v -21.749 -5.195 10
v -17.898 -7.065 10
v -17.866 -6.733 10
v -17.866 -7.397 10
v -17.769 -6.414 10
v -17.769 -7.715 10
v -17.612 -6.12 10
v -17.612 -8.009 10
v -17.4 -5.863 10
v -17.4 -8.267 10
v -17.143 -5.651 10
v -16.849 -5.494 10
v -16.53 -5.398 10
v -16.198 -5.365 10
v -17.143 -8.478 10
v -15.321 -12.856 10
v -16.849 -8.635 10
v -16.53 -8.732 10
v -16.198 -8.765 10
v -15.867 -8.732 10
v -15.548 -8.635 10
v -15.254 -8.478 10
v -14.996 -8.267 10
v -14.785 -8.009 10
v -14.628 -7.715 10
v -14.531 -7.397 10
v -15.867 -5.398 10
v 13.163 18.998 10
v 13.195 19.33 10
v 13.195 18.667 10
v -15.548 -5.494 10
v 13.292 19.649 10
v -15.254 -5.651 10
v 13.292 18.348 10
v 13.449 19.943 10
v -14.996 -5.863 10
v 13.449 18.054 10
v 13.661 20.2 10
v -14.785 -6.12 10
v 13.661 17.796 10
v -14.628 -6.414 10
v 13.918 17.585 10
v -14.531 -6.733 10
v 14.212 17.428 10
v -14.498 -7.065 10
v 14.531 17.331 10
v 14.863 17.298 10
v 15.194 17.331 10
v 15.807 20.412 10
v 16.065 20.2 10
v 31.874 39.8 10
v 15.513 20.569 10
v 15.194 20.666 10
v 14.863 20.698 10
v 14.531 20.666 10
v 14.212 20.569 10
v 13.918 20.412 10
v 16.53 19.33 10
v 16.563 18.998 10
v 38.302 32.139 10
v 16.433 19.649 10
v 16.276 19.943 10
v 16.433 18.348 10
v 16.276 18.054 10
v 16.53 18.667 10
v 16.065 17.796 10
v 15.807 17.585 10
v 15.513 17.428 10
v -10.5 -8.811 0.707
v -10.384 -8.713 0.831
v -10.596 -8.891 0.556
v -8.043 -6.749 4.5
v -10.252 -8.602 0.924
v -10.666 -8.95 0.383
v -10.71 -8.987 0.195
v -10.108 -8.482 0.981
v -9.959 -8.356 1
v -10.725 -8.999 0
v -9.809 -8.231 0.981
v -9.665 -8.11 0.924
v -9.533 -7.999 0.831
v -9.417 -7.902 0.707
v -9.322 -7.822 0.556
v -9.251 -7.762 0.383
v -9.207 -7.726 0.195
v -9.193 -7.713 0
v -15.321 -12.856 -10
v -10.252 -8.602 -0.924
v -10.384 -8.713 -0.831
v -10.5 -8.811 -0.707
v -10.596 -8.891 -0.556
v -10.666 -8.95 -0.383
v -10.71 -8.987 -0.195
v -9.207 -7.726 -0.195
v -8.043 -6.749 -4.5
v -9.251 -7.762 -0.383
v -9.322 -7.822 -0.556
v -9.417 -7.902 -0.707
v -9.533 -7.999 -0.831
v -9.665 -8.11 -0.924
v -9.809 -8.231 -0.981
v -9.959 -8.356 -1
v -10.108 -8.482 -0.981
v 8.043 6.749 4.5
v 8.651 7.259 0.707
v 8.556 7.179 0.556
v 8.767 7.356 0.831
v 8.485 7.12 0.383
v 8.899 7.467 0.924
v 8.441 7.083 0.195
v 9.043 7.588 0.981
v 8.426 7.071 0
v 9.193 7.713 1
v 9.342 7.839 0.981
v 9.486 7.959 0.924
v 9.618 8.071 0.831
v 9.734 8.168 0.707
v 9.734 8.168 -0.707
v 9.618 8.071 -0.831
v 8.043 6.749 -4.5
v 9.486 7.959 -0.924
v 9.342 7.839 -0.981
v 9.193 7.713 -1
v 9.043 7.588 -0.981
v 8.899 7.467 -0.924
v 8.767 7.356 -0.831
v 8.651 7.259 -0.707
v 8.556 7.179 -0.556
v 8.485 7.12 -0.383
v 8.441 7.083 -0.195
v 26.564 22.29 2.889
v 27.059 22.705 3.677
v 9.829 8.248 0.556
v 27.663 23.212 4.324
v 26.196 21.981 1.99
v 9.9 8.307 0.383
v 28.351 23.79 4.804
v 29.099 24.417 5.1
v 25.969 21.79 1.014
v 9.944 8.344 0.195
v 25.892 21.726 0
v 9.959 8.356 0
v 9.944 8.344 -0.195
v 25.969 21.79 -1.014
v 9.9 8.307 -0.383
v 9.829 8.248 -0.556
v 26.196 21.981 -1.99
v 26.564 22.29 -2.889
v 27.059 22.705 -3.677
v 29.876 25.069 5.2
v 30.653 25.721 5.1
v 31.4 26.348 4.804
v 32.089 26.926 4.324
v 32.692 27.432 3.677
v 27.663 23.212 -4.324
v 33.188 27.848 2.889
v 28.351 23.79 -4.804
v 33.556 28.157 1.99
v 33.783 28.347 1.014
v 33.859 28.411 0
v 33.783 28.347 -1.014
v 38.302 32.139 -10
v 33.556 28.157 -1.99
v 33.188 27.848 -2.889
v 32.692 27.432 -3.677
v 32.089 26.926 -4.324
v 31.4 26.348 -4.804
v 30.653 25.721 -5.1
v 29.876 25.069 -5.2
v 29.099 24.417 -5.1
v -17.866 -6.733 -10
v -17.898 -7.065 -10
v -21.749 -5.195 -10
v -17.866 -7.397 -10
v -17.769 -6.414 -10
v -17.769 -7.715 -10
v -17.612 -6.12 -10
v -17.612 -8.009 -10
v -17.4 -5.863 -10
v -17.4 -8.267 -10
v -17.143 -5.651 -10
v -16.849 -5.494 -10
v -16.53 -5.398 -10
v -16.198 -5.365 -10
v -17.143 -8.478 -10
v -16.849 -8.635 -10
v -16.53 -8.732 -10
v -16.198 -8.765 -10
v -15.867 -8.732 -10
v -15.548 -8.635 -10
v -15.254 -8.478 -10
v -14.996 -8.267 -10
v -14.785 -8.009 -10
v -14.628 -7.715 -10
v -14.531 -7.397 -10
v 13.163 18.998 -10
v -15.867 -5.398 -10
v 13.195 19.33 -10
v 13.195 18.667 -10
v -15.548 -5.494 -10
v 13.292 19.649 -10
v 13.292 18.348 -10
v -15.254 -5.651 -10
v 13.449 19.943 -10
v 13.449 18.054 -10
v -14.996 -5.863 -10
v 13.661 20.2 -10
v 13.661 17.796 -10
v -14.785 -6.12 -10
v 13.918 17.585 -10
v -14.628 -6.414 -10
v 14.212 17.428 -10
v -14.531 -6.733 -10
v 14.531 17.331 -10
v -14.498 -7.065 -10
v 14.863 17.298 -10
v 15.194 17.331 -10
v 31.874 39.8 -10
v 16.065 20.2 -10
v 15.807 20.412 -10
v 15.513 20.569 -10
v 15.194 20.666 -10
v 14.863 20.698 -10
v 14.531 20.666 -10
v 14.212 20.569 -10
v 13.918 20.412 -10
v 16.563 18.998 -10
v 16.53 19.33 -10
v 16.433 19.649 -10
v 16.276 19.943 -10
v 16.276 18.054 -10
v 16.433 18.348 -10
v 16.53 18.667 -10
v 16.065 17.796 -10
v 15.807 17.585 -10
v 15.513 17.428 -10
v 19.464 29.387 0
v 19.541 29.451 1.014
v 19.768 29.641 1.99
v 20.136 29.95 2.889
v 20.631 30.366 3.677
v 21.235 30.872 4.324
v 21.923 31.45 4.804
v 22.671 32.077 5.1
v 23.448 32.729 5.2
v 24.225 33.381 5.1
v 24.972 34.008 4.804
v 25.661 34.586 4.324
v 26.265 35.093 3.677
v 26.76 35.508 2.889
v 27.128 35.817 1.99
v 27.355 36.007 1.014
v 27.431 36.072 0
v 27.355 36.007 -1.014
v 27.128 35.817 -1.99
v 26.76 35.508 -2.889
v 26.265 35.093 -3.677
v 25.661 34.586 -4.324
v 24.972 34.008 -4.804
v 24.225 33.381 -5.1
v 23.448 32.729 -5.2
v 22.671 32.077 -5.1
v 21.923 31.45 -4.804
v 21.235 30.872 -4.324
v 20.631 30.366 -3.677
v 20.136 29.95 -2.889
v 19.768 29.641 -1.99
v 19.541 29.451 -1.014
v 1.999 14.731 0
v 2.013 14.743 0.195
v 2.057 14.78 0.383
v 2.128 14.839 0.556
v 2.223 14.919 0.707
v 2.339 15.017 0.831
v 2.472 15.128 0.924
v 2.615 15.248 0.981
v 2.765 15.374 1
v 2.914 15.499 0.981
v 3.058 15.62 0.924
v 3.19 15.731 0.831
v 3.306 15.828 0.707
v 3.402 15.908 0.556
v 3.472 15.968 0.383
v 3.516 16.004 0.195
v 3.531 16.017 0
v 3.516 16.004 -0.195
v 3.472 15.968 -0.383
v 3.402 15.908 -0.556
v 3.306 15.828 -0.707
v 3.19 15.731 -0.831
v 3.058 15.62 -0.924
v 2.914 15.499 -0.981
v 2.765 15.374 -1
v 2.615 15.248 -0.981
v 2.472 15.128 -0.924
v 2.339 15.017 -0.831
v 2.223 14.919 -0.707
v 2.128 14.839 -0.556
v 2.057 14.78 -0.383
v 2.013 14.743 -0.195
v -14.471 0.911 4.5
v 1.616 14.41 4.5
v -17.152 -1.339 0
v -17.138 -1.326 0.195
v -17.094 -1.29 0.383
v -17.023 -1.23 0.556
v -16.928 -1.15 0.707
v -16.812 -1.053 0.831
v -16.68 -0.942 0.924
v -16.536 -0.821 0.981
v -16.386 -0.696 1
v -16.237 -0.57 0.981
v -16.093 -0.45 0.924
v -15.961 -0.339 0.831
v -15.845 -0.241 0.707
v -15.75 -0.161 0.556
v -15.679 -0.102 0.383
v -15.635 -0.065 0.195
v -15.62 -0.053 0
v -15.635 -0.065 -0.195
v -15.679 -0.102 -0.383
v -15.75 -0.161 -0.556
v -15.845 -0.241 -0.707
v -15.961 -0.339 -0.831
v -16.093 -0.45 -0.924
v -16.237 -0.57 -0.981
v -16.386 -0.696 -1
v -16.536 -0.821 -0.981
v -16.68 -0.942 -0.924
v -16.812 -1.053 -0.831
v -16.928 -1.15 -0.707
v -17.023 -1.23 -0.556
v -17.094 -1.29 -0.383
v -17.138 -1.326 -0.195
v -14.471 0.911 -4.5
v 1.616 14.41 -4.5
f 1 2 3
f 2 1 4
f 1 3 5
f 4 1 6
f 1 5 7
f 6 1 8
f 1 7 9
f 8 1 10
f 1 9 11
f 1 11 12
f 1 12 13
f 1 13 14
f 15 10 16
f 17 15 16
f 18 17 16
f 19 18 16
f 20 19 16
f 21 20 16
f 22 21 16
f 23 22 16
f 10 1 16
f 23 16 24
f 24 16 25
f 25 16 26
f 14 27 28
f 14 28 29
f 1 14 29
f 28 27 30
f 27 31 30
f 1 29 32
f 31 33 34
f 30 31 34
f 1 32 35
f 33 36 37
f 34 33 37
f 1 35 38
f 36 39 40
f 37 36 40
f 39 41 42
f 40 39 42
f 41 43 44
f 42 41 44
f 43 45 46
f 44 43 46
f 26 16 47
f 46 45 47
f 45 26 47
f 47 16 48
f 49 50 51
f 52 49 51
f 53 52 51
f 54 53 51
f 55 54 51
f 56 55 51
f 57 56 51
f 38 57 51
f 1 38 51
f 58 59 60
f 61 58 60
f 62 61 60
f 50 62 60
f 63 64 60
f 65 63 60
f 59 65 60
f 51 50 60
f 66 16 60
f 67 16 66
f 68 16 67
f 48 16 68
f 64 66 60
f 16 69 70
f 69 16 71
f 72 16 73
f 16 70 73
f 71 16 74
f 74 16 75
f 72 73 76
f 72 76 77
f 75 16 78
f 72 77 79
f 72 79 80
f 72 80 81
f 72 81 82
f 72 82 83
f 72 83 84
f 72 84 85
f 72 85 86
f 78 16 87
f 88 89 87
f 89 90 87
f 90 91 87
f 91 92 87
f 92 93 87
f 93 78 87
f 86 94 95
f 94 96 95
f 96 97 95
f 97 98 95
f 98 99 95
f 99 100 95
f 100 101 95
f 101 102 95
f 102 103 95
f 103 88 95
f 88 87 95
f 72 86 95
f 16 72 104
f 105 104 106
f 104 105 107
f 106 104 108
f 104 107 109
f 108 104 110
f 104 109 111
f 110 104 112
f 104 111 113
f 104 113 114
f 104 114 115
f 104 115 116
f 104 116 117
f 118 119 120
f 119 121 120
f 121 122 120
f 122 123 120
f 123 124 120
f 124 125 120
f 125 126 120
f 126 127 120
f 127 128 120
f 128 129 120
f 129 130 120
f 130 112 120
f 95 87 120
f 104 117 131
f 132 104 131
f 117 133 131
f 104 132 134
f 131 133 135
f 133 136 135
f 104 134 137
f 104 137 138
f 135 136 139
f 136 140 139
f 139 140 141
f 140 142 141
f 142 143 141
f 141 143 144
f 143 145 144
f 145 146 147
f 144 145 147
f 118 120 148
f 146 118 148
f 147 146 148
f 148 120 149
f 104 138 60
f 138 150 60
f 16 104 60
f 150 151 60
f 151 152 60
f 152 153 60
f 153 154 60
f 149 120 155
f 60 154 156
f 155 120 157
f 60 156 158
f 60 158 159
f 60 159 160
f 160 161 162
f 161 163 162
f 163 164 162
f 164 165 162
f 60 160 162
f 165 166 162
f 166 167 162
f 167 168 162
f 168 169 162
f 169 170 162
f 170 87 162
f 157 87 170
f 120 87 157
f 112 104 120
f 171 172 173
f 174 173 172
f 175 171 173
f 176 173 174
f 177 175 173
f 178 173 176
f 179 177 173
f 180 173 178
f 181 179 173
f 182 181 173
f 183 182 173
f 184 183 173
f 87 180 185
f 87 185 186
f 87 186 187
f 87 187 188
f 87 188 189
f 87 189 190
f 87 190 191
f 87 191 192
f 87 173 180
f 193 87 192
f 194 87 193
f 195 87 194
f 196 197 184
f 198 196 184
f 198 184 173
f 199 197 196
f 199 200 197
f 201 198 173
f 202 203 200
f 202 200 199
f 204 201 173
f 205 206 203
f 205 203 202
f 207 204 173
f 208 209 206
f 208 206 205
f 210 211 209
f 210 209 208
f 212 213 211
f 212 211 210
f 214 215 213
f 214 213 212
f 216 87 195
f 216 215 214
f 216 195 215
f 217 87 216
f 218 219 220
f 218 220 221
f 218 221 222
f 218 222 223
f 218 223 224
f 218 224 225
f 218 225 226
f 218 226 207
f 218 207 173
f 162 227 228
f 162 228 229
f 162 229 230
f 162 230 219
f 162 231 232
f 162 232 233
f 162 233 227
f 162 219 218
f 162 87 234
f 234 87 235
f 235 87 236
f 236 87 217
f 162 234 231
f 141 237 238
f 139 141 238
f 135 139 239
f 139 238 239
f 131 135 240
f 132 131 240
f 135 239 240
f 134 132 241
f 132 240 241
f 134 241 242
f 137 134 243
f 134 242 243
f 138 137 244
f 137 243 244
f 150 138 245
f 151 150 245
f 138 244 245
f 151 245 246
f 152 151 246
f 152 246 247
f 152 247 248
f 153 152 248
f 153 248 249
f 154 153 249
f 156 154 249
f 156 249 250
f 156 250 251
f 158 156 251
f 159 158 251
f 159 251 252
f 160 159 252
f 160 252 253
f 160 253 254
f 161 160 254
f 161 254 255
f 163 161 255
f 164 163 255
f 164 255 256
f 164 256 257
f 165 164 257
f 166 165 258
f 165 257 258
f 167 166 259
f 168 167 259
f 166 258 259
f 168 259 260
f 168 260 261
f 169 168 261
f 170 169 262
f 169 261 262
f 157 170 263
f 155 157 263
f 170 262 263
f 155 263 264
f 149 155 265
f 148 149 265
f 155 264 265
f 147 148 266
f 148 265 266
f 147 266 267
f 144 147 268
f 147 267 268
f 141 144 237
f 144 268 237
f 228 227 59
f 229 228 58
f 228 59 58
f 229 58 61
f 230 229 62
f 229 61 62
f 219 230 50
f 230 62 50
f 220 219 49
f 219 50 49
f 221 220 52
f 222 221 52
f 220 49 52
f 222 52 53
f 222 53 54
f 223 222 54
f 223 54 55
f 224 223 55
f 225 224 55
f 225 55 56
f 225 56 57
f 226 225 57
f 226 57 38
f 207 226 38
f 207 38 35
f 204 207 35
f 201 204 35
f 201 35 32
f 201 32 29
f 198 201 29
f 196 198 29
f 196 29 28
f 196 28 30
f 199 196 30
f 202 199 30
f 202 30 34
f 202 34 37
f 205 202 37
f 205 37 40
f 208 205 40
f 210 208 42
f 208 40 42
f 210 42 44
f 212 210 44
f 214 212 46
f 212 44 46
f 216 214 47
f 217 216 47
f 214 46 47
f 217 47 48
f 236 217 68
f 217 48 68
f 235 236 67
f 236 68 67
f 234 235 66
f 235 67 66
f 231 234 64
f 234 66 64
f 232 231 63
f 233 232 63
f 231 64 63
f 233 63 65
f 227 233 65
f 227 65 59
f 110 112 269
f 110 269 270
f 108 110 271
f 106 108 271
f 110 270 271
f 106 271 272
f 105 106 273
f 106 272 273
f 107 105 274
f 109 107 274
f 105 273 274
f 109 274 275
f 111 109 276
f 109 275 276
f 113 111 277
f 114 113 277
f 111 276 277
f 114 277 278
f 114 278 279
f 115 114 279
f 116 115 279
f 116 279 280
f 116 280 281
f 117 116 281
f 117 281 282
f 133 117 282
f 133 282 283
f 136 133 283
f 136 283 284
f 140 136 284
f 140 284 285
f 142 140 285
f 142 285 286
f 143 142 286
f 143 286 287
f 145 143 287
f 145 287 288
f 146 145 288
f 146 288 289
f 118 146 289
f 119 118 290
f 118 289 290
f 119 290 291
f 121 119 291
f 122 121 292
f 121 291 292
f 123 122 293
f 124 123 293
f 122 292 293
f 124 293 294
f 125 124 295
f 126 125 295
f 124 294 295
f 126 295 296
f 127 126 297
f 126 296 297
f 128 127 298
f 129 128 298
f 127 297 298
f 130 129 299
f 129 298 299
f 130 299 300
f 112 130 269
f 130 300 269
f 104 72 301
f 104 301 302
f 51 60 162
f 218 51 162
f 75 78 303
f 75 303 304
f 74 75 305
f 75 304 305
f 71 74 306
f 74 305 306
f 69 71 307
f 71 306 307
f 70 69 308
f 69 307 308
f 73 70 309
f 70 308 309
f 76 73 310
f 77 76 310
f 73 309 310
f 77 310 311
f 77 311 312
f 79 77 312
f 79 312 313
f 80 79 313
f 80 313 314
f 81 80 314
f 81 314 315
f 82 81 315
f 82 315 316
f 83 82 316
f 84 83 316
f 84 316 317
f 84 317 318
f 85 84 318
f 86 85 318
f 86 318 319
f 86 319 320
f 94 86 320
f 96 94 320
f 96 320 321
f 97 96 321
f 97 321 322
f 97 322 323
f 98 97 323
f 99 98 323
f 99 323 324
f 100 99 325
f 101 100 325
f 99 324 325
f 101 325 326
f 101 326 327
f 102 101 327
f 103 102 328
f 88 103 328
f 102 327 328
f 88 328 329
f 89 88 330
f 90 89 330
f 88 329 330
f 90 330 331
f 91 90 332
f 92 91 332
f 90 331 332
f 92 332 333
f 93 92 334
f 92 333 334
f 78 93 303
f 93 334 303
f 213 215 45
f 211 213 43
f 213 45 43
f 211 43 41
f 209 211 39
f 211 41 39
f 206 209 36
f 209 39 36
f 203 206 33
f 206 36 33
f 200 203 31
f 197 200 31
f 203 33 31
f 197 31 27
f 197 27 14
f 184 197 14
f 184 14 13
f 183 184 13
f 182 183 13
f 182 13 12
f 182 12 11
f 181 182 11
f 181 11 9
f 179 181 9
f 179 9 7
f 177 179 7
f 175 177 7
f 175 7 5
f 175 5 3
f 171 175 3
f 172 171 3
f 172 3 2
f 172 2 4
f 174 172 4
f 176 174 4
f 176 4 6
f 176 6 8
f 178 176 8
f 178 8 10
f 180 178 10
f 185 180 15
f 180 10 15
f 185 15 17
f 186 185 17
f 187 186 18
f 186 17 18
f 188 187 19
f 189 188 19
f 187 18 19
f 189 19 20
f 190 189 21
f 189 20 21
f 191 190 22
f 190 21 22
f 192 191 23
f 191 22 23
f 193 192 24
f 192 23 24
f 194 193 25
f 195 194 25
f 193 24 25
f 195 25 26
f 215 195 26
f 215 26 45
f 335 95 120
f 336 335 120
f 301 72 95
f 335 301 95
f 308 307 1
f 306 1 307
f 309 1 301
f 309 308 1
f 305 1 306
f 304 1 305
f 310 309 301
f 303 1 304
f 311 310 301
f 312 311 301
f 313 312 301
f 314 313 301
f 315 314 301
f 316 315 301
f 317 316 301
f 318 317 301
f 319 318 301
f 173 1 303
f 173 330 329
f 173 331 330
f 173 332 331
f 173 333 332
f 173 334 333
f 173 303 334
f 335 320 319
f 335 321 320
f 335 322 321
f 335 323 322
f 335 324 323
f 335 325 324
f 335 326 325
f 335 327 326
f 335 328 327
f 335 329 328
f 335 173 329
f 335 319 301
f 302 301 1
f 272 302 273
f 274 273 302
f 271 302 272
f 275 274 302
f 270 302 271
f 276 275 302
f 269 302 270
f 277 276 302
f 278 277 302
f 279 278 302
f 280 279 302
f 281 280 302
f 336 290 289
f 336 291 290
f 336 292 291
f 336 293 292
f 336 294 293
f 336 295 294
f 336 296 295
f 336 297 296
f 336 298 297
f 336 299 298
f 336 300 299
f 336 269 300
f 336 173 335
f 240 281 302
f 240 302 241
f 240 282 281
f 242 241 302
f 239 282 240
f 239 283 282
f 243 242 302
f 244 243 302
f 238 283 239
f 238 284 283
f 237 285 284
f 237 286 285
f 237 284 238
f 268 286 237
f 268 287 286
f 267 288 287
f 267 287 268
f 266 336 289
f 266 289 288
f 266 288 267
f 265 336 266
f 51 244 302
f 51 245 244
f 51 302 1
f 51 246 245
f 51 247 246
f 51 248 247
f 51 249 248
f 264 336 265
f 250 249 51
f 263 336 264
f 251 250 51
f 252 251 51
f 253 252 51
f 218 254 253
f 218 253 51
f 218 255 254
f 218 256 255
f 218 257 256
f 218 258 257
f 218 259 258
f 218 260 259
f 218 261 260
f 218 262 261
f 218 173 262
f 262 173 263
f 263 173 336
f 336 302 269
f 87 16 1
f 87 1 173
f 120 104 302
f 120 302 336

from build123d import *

# Parameters (mm, degrees)
SKETCH_1_W          = 70
SKETCH_1_H          = 20
SKETCH_1_W_2        = 21
SKETCH_1_H_2        = 9
EXTRUDE_1_DEPTH     = 10
CUT_EXTRUDE_1_REACH = 57.98
SKETCH_3_R          = 5.2
SKETCH_3_R_2        = 1
CUT_EXTRUDE_2_REACH = 60.746
SKETCH_4_R          = 1.7


with BuildPart() as part:
    # 草图1 → 凸台-拉伸1 (new body)
    with BuildSketch(Plane(origin=(0, 0, 0), x_dir=(0.7660444431189771, 0.6427876096865406, 0), z_dir=(-0.6427876096865406, 0.7660444431189771, 0))):
        with Locations((15, 0)):
            Rectangle(SKETCH_1_W, SKETCH_1_H)
        Rectangle(SKETCH_1_W_2, SKETCH_1_H_2, mode=Mode.SUBTRACT)
    extrude(amount=EXTRUDE_1_DEPTH)

    # 草图3 → 切除-拉伸1 (cut, up to next)
    with BuildSketch(Plane(origin=(-6.427876097, 7.660444431, 0), x_dir=(0.7660444431189771, 0.6427876096865406, 0), z_dir=(-0.6427876096865405, 0.766044443118977, 0)), mode=Mode.PRIVATE) as cut_extrude_1_sk1:
        with Locations((39, 0)):
            Circle(SKETCH_3_R)
    cut_extrude_1_tool1 = extrude(cut_extrude_1_sk1.sketch, amount=-CUT_EXTRUDE_1_REACH, mode=Mode.PRIVATE) & part.part
    # 草图3 → 切除-拉伸1 (cut, up to next)
    with BuildSketch(Plane(origin=(-6.427876097, 7.660444431, 0), x_dir=(0.7660444431189771, 0.6427876096865406, 0), z_dir=(-0.6427876096865405, 0.766044443118977, 0)), mode=Mode.PRIVATE) as cut_extrude_1_sk2:
        with Locations((-13, 0)):
            Circle(SKETCH_3_R_2)
    cut_extrude_1_tool2 = extrude(cut_extrude_1_sk2.sketch, amount=-CUT_EXTRUDE_1_REACH, mode=Mode.PRIVATE) & part.part
    # 草图3 → 切除-拉伸1 (cut, up to next)
    with BuildSketch(Plane(origin=(-6.427876097, 7.660444431, 0), x_dir=(0.7660444431189771, 0.6427876096865406, 0), z_dir=(-0.6427876096865405, 0.766044443118977, 0)), mode=Mode.PRIVATE) as cut_extrude_1_sk3:
        with Locations((12, 0)):
            Circle(SKETCH_3_R_2)
    cut_extrude_1_tool3 = extrude(cut_extrude_1_sk3.sketch, amount=-CUT_EXTRUDE_1_REACH, mode=Mode.PRIVATE) & part.part
    add(cut_extrude_1_tool1.solids().sort_by_distance((23.447857, 32.729161, 0))[0], mode=Mode.SUBTRACT)
    add(cut_extrude_1_tool2.solids().sort_by_distance((-16.386454, -0.695794, 0))[0], mode=Mode.SUBTRACT)
    add(cut_extrude_1_tool3.solids().sort_by_distance((2.764657, 15.373896, 0))[0], mode=Mode.SUBTRACT)

    # 草图4 → 切除-拉伸2 (cut, up to next)
    with BuildSketch(Plane.XY.offset(10), mode=Mode.PRIVATE) as cut_extrude_2_sk1:
        with Locations((-16.198218668, -7.064882864)):
            Circle(SKETCH_4_R)
    cut_extrude_2_tool1 = extrude(cut_extrude_2_sk1.sketch, amount=-CUT_EXTRUDE_2_REACH, mode=Mode.PRIVATE) & part.part
    # 草图4 → 切除-拉伸2 (cut, up to next)
    with BuildSketch(Plane.XY.offset(10), mode=Mode.PRIVATE) as cut_extrude_2_sk2:
        with Locations((14.862649296, 18.998279989)):
            Circle(SKETCH_4_R)
    cut_extrude_2_tool2 = extrude(cut_extrude_2_sk2.sketch, amount=-CUT_EXTRUDE_2_REACH, mode=Mode.PRIVATE) & part.part
    add(cut_extrude_2_tool1.solids().sort_by_distance((-16.198219, -7.064883, 10))[0], mode=Mode.SUBTRACT)
    add(cut_extrude_2_tool2.solids().sort_by_distance((14.862649, 18.99828, 10))[0], mode=Mode.SUBTRACT)


solid = part.part
